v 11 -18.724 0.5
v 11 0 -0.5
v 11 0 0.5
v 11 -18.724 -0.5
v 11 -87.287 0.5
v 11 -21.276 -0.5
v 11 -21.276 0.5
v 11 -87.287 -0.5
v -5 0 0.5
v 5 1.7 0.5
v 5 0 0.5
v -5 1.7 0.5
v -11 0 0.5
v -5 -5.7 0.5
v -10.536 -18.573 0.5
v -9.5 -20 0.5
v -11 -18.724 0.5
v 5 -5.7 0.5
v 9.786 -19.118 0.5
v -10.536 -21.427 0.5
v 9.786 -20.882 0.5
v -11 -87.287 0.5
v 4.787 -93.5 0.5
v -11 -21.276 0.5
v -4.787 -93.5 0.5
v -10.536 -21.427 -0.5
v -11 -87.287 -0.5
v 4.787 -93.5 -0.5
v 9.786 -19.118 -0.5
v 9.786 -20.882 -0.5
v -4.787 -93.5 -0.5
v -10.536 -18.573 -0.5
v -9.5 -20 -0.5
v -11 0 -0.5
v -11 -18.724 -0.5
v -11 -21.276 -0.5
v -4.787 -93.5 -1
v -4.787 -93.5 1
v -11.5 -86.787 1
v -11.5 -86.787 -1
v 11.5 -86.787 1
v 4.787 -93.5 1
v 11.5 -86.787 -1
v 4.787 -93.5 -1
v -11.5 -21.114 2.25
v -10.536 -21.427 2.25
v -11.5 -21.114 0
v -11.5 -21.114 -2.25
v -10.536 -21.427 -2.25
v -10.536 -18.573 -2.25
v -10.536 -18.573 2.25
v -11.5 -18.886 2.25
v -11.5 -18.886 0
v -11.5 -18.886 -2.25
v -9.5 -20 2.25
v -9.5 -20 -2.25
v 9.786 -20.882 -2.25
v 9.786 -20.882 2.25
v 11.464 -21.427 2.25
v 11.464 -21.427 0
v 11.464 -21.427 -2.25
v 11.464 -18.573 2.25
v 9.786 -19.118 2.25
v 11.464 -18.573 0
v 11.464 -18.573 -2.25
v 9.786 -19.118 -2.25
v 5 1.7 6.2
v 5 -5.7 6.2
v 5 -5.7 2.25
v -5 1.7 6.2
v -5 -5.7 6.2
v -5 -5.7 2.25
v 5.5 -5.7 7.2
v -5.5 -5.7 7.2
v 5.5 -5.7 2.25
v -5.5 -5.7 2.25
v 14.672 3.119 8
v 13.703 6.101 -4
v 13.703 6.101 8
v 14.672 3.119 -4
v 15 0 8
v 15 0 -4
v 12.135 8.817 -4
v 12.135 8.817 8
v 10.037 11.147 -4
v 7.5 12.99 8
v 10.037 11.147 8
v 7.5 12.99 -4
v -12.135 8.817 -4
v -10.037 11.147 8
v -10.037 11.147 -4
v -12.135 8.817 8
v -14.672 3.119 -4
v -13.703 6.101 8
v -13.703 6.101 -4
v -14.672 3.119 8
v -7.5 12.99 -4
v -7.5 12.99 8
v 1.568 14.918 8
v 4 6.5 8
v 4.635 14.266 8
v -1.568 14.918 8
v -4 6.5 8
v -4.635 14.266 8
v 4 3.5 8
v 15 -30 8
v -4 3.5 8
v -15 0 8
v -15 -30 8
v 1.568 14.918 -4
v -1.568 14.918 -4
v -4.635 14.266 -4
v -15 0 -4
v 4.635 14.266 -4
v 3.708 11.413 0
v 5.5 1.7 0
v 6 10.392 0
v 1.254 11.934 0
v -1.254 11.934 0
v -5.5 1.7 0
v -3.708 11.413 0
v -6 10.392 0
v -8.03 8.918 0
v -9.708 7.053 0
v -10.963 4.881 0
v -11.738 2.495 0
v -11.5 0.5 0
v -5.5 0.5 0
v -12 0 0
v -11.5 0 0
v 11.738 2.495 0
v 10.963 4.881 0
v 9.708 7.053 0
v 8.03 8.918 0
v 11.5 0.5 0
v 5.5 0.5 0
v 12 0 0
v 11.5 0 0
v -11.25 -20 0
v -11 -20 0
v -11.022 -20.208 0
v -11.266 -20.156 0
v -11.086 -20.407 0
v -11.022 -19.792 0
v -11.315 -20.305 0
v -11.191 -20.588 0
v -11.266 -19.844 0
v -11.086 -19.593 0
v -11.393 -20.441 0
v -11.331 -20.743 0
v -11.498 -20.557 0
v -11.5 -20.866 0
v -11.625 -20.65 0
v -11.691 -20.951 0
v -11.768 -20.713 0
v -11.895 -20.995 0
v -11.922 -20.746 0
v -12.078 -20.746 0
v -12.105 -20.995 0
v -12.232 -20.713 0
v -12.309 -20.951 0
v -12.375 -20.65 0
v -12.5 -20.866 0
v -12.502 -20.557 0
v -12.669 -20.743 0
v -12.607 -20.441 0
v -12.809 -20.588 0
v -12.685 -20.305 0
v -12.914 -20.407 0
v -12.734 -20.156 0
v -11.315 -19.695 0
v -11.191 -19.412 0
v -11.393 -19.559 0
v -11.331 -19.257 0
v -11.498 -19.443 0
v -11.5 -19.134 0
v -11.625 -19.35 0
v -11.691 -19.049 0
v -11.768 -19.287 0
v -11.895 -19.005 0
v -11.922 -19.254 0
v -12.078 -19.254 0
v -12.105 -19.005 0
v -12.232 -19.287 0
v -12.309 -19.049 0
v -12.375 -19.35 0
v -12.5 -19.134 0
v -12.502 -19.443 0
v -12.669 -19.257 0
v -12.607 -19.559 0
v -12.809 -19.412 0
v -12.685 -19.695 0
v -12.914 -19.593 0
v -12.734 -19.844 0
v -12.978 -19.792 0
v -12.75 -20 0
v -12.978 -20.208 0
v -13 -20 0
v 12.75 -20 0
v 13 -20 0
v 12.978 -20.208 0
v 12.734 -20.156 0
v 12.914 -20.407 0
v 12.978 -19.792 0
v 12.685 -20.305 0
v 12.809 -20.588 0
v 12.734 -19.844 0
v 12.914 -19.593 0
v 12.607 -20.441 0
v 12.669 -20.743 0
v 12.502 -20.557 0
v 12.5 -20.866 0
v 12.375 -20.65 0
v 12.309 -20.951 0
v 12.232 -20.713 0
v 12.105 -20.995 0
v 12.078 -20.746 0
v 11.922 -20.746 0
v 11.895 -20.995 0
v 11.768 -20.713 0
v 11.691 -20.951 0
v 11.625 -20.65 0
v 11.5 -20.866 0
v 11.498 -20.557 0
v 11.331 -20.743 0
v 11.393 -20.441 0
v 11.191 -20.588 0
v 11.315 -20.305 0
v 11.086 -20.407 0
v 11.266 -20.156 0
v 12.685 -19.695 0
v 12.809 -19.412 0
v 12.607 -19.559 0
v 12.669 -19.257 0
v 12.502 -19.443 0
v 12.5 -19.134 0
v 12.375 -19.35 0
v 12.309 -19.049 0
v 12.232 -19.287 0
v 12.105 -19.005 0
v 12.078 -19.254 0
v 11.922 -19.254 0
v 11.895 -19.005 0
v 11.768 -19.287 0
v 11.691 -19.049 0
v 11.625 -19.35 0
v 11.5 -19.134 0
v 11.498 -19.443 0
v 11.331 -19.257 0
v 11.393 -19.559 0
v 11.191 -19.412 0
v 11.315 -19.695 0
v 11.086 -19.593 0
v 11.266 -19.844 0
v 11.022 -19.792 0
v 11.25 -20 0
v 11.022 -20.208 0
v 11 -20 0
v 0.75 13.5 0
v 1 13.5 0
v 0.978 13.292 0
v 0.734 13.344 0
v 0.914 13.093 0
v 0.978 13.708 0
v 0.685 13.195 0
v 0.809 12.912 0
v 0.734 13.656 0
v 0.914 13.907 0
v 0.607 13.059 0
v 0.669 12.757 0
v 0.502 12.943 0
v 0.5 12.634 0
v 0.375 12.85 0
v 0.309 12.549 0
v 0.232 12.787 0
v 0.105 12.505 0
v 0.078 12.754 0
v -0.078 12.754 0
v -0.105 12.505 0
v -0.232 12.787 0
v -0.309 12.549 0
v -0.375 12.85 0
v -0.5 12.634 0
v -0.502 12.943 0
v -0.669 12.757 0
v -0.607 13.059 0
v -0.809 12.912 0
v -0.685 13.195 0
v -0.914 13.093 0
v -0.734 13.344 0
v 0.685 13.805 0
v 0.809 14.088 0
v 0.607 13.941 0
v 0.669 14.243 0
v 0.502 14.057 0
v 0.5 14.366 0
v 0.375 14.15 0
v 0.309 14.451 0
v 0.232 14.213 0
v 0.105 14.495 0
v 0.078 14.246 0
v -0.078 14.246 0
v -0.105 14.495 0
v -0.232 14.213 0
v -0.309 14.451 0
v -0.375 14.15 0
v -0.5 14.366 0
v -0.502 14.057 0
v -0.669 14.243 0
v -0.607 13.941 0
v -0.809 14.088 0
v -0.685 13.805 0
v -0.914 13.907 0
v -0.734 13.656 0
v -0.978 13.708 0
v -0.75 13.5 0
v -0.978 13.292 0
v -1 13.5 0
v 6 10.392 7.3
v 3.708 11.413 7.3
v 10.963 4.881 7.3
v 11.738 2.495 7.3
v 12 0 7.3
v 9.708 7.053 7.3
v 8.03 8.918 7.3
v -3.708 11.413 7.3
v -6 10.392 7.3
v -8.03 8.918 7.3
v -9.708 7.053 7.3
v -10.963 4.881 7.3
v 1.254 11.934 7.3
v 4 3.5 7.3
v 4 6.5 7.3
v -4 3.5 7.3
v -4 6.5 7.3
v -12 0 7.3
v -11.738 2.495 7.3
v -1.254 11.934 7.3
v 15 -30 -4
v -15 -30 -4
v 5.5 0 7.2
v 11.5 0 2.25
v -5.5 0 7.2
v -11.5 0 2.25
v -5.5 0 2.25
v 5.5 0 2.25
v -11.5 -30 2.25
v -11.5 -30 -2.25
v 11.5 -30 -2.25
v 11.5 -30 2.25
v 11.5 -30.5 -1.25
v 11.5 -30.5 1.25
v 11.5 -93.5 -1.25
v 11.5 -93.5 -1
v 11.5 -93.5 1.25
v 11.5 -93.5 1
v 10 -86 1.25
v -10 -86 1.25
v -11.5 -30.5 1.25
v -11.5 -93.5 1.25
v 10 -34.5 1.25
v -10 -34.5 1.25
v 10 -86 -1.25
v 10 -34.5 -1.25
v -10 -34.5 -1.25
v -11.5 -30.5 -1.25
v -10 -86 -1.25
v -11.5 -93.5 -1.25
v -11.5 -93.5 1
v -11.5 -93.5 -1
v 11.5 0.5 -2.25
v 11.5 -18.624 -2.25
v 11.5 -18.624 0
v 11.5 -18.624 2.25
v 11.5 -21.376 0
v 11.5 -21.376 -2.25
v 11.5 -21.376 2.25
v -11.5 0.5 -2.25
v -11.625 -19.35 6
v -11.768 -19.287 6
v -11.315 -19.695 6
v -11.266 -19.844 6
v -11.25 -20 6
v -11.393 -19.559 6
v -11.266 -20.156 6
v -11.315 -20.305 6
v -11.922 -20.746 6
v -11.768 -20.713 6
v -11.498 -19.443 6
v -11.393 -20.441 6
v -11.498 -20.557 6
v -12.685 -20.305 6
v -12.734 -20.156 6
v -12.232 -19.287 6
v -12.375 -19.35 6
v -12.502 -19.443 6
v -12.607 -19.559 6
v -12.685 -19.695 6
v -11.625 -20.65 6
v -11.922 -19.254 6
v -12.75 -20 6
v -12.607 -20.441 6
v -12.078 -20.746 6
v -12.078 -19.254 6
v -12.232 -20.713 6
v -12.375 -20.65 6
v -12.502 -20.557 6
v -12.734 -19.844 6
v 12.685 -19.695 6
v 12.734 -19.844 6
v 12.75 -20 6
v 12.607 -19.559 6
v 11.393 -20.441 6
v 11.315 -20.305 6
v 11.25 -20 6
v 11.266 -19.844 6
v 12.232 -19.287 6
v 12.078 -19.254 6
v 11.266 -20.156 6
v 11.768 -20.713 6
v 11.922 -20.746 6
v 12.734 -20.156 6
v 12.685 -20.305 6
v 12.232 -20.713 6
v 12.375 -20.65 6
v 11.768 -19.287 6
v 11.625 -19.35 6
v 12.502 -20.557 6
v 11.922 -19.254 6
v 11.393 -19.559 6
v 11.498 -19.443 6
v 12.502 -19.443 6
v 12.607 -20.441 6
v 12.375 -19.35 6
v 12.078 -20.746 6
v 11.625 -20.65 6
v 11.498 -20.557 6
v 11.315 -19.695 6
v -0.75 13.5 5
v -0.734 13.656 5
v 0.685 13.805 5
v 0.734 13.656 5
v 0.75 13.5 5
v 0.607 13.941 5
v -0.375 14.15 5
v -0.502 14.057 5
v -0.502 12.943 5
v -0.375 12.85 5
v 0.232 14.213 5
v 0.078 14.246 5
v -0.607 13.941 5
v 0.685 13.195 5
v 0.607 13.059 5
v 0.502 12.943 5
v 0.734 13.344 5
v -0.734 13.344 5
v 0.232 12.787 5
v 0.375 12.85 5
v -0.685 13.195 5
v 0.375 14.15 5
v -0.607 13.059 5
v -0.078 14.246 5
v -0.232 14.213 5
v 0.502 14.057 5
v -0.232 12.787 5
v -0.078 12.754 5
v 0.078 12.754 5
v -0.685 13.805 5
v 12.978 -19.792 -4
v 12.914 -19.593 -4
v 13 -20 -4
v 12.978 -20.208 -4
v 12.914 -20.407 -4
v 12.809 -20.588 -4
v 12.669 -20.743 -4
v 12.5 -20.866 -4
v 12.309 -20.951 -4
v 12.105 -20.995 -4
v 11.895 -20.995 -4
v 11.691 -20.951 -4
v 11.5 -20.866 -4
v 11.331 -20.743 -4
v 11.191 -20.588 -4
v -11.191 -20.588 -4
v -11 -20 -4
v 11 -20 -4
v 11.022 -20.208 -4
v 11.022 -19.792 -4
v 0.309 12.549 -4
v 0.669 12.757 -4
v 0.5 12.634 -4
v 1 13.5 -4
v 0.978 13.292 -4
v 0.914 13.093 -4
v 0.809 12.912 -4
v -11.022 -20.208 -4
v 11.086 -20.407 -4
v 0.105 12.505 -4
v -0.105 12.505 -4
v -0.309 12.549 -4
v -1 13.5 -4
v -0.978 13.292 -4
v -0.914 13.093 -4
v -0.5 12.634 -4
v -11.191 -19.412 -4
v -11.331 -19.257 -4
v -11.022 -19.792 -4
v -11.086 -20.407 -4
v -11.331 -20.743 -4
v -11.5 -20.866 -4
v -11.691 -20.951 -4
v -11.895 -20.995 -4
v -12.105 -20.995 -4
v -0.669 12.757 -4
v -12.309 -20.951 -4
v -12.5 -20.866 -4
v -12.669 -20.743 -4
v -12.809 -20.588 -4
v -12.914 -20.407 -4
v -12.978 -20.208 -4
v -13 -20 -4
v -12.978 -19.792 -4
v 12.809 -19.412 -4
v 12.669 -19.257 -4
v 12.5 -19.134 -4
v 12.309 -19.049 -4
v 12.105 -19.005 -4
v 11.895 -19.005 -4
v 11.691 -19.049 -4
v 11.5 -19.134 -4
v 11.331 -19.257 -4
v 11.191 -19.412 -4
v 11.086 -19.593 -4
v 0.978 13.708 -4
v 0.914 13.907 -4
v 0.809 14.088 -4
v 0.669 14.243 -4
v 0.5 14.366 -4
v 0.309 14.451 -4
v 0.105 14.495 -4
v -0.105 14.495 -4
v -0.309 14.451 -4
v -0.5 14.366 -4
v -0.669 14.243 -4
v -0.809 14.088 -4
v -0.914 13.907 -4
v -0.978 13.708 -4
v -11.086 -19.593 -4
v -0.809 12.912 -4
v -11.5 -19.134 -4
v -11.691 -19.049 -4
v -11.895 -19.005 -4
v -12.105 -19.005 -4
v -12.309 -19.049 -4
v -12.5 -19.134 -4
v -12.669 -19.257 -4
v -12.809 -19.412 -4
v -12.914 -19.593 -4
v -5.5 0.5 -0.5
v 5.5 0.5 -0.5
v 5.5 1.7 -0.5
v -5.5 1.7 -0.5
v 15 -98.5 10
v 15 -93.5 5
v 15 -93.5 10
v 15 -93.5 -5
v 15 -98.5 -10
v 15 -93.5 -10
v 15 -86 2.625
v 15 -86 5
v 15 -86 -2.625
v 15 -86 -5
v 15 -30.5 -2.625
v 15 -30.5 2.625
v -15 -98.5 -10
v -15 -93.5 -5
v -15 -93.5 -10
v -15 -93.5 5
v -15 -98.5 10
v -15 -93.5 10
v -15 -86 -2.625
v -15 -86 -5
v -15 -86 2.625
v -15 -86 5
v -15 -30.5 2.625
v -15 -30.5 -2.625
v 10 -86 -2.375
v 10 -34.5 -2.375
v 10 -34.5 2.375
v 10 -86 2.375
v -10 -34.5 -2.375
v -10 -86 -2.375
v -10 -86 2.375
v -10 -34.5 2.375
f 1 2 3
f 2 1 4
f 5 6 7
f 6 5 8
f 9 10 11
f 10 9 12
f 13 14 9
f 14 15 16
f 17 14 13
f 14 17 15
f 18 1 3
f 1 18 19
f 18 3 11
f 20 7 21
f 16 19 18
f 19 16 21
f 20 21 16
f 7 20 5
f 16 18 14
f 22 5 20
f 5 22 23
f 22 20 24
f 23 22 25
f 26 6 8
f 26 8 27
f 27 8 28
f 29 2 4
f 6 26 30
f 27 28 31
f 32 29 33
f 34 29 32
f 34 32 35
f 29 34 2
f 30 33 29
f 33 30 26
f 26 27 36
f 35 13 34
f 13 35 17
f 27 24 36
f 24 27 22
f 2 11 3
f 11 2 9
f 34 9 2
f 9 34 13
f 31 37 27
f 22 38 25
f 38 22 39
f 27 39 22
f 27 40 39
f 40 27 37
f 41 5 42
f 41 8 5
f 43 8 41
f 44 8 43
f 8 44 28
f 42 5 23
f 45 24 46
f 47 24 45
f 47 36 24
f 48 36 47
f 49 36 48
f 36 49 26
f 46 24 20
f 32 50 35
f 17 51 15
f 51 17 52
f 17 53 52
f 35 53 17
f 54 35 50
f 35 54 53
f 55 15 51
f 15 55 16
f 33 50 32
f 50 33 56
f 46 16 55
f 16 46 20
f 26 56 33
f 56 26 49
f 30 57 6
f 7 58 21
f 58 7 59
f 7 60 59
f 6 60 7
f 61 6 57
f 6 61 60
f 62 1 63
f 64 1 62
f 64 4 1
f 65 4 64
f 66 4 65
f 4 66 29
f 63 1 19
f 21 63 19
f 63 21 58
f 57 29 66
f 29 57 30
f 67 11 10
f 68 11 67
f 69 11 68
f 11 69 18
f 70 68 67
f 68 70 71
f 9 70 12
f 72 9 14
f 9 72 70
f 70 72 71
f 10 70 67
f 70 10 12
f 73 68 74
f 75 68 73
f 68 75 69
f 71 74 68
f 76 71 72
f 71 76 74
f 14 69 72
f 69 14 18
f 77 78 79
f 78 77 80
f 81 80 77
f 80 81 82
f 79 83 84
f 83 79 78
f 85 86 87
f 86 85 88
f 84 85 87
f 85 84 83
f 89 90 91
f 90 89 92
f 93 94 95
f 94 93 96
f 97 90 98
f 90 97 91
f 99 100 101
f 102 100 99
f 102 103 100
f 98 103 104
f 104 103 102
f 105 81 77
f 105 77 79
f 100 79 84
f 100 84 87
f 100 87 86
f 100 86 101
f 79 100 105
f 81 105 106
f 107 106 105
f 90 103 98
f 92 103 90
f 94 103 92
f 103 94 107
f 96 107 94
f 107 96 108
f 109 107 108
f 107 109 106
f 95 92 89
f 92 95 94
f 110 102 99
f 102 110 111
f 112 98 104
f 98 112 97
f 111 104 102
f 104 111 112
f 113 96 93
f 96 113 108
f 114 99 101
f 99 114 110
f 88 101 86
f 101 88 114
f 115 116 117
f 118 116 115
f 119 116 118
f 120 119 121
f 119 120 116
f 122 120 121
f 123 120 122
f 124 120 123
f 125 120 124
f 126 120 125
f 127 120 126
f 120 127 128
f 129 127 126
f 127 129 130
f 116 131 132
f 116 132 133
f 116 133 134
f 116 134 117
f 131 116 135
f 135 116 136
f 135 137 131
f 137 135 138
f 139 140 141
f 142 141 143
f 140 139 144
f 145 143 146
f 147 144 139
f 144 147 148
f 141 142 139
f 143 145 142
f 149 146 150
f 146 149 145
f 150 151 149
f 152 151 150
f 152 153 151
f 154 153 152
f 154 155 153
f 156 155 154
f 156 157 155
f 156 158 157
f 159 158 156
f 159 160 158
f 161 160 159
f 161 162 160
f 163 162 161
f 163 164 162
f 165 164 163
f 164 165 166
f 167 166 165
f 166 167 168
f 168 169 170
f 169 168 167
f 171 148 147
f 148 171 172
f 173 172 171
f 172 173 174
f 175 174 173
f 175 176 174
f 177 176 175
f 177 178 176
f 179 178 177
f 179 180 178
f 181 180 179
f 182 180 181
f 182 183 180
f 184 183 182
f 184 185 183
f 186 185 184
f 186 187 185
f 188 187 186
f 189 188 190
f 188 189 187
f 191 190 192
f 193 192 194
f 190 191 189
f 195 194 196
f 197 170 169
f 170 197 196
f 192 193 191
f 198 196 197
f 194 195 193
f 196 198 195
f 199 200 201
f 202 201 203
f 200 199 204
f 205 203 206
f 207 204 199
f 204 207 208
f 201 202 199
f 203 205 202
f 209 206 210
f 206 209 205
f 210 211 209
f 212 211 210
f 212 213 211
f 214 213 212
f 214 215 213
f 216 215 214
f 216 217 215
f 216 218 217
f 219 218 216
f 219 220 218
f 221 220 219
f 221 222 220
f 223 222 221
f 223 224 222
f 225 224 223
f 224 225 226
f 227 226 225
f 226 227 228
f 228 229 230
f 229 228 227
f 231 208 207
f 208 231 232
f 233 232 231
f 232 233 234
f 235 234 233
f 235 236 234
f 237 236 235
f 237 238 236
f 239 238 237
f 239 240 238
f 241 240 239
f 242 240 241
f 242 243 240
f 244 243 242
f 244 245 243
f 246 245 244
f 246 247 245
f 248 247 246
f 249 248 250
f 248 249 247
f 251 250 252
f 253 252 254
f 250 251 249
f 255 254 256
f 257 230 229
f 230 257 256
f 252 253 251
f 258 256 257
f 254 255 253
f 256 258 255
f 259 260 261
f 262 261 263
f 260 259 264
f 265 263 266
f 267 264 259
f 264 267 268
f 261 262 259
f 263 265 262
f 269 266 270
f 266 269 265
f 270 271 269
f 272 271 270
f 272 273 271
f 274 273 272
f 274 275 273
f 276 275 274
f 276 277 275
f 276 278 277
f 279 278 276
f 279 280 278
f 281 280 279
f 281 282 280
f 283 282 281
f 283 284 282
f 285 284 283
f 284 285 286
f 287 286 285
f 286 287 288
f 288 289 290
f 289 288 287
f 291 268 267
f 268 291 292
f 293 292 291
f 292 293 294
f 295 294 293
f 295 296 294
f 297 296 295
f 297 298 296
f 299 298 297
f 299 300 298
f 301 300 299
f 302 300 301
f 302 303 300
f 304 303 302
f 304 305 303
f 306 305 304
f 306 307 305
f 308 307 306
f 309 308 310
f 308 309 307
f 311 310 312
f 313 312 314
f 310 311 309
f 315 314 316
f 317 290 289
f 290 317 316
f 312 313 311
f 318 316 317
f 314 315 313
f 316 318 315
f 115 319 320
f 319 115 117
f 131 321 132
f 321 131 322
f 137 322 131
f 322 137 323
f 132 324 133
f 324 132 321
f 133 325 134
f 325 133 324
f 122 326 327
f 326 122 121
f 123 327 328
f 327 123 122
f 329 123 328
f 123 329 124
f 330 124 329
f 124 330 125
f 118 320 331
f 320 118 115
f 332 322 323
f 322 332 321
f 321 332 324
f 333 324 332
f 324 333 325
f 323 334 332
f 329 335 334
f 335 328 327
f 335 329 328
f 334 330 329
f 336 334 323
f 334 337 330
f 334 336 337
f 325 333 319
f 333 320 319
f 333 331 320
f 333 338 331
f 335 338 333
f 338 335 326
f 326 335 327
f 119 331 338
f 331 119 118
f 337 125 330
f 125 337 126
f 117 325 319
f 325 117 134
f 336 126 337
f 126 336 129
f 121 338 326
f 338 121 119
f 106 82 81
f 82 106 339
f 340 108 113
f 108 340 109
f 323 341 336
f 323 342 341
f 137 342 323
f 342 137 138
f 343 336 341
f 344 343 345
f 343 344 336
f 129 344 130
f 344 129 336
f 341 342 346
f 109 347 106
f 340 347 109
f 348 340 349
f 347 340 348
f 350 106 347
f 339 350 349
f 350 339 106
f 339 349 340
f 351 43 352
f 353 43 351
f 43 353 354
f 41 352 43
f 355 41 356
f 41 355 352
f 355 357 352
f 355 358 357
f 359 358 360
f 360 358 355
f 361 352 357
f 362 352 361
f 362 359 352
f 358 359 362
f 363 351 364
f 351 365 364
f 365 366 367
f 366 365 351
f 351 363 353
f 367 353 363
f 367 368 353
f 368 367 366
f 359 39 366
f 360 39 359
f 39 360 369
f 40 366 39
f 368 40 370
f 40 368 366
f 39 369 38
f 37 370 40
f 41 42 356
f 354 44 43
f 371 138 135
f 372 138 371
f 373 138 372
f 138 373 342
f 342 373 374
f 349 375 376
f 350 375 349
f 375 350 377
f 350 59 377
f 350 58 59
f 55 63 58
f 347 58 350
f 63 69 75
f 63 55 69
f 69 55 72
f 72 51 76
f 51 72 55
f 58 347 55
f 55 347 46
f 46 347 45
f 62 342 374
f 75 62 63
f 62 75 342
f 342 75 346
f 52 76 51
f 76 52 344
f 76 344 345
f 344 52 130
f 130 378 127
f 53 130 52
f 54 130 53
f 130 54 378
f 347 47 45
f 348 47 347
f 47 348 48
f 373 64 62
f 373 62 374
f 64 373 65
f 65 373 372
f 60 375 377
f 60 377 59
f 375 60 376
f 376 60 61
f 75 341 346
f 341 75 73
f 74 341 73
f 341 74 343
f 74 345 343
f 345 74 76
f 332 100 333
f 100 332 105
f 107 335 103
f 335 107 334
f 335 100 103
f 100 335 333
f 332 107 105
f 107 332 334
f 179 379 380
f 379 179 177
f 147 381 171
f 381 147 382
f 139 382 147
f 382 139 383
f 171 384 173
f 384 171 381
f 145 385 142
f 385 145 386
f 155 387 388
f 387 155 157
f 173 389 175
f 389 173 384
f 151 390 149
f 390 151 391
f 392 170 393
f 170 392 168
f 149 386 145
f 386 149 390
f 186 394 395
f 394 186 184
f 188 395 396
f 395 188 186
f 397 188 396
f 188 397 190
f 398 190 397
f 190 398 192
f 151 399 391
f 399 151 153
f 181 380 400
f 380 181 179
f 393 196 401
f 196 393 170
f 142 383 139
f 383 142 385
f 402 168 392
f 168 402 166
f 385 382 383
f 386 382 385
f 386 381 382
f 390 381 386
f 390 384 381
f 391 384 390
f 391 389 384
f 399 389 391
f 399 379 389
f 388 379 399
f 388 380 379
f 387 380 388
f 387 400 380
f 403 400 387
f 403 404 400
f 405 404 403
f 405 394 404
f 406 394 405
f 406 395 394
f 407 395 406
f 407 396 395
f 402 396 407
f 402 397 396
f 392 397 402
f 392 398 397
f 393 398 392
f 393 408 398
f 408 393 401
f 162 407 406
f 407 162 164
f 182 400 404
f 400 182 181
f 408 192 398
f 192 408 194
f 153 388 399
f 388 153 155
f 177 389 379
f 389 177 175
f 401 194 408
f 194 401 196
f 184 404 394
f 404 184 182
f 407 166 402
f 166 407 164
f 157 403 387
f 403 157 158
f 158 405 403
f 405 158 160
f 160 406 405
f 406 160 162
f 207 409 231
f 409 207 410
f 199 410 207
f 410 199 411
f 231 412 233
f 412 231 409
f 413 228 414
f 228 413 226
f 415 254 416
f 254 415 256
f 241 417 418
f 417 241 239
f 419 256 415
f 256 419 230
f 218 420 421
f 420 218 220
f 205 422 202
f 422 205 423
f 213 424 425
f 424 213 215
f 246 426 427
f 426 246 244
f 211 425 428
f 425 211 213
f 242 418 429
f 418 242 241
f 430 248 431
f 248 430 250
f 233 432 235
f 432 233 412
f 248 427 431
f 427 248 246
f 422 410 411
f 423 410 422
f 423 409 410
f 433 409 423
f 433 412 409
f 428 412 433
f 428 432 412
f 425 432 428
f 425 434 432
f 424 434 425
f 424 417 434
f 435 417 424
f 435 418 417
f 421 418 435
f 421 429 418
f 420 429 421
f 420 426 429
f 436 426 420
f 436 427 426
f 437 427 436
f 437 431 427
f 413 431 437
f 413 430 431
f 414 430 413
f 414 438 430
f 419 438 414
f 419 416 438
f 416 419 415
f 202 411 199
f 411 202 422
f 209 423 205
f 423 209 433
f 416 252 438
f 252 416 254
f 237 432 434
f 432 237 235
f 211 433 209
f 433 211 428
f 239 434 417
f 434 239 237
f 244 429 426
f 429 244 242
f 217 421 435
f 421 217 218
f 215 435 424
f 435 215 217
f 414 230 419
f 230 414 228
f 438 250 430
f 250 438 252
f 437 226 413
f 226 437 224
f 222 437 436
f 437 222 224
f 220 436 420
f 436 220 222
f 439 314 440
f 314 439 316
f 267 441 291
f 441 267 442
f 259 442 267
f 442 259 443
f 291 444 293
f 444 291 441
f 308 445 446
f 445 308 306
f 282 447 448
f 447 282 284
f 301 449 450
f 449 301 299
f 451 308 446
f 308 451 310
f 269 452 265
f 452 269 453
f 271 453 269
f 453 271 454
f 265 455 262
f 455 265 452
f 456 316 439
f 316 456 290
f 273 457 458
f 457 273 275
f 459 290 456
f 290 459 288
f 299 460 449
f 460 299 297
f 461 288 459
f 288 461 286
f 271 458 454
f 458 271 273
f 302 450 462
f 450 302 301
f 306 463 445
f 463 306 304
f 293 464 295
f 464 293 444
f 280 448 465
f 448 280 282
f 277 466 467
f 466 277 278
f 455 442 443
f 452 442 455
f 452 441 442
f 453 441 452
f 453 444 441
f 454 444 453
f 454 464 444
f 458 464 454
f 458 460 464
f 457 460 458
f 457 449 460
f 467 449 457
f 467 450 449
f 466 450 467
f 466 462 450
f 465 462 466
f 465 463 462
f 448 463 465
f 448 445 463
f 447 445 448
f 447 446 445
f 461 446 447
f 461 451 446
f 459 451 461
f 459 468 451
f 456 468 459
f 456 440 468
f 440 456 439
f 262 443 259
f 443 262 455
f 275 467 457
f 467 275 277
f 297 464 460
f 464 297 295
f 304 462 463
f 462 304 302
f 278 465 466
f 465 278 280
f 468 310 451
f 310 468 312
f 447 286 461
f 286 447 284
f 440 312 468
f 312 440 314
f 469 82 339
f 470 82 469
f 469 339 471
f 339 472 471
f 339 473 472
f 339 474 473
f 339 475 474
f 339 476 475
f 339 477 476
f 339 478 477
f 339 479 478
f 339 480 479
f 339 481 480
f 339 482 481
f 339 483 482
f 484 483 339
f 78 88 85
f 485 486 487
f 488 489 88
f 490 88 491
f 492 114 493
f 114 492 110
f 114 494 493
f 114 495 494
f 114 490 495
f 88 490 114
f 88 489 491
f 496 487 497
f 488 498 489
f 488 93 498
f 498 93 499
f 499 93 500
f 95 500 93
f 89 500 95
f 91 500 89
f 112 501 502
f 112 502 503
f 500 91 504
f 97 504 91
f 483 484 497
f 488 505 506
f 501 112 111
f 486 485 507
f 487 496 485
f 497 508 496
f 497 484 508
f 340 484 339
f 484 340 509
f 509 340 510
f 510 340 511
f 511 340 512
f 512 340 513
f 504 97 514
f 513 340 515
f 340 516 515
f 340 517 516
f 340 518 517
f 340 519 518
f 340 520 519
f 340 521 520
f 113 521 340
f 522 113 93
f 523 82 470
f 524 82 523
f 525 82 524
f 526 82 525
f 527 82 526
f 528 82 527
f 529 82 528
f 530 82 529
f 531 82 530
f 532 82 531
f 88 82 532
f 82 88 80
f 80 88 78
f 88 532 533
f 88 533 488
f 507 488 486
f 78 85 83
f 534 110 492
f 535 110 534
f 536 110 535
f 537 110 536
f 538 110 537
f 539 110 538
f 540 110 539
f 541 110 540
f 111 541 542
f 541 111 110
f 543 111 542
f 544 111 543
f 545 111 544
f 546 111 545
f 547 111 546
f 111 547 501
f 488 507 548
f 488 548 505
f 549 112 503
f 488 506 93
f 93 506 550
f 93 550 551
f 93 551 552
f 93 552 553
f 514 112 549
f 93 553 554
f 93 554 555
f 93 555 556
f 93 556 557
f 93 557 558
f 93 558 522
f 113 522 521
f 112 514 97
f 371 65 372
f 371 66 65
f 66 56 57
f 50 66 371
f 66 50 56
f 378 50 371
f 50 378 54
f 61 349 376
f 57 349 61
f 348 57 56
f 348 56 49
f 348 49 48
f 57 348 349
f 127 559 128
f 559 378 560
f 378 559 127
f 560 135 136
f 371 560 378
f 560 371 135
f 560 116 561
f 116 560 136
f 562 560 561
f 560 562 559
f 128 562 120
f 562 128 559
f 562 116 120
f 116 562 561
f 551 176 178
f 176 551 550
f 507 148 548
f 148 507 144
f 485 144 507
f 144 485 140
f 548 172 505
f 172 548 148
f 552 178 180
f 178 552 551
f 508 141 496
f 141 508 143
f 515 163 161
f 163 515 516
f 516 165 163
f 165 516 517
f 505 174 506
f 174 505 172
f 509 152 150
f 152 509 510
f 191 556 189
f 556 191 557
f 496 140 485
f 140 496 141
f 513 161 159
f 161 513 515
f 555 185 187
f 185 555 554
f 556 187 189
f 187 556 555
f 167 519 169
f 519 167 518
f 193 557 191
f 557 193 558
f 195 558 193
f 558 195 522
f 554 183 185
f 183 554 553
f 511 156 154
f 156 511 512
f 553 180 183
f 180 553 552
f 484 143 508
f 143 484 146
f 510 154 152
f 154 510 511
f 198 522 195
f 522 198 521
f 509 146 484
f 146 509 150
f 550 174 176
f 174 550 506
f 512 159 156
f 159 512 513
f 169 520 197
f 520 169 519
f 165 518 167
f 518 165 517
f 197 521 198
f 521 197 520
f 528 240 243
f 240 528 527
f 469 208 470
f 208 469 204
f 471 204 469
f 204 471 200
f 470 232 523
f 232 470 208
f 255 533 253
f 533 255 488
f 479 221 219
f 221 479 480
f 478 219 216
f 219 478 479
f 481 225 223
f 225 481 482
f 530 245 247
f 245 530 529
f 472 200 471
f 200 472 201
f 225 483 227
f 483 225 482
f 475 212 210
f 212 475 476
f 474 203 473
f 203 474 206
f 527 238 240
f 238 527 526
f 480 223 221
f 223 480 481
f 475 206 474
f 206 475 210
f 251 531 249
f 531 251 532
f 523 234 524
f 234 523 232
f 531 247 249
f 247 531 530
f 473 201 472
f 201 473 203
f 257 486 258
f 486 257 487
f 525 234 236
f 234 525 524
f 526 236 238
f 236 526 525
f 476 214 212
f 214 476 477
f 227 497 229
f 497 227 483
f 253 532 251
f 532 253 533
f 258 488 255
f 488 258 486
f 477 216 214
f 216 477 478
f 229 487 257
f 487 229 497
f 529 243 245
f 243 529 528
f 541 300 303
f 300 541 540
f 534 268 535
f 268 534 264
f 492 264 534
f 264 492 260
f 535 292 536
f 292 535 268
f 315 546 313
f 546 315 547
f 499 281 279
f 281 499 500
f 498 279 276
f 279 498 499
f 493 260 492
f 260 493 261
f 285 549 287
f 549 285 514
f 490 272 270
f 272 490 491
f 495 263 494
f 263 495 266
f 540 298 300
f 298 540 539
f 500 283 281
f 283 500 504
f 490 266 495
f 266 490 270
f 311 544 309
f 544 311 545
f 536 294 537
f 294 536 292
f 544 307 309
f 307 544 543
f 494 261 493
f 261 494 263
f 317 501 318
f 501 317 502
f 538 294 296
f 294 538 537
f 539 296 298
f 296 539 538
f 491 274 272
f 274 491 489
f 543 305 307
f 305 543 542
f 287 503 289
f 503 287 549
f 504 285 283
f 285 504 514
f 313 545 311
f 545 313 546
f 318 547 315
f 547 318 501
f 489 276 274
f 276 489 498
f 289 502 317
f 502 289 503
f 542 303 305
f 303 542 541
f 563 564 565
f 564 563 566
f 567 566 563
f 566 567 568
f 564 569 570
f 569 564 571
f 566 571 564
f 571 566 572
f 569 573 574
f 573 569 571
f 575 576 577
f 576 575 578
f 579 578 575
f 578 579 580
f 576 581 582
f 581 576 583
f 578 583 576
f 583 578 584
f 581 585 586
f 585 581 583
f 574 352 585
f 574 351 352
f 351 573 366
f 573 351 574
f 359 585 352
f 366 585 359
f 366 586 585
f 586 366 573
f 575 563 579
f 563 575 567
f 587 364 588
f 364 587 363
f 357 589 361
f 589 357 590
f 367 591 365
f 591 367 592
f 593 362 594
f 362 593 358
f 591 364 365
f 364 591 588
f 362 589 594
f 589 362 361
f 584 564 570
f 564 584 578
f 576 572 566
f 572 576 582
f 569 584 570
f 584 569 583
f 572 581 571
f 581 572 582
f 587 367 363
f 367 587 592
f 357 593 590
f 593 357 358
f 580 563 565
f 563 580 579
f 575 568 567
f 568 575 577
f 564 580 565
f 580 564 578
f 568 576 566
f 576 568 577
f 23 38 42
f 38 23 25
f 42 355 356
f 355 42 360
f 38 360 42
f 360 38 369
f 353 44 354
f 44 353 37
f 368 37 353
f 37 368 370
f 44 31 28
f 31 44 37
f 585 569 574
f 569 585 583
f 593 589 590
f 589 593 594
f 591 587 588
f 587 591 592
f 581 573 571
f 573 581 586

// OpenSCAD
// Moisture Sensor

MoistureSensor = true;
MoistureSensorBox = true;
MoistureSensorBoxUnten = true;
MoistureSensorHuelle = true;
Membran = true;

if (MoistureSensor) MoistureSensor();
if (MoistureSensorBox) MoistureSensorBox();
if (MoistureSensorBoxUnten) MoistureSensorBoxUnten();
if (MoistureSensorHuelle) MoistureSensorHuelle();
if (Membran) { 
    Membran();
    translate([0,0,-5])
    Membran();
}

msl = 97.5;     //Sensor Länge
msb = 22.0;     //Sensor Breite
msh = 1.0;      //Sensor Höhe 

module MoistureSensor(negative=false) 

translate([0,-msl/2,0])
union() {
    
    // Kabelanschluss
    if (negative) {
        color("white")
        translate([0,msl/2-2,5.7/2+msh/2])
        cube([10+1,7.4,5.7],center=true);
    } else {
        color("white")
        translate([0,msl/2-2,5.7/2+msh/2])
        cube([10,7.4,5.7],center=true);
    }
    
    // PCB-Sensor
    color("darkgreen")
    difference(){
        if (negative) cube([msb+1,msl+1,msh+1.5],center=true);
        else cube([msb,msl,msh],center=true);
            
        translate([-msb,-msl/2,0])
        rotate([0,0,45])
        cube([30,30,2],center=true);
        
        translate([msb,-msl/2,0])
        rotate([0,0,45])
        cube([30,30,2],center=true);

        translate([-msb/2,-msl/2+77.5,-2])
        cylinder(d=3.0, h=5);

        translate([msb/2,-msl/2+77.5,-2])
        cylinder(d=3.0, h=5);
    }
}

module MoistureSensorBox() {
    
    difference(){
        boxOben();
        translate([0,0,1])
        MoistureSensor(true);
        
        // Kabelloch
        translate([0,5,6])
        cube([8,3,5.7],center=true);
        
        // Schraubloch
        translate([-12,-20,-2])
        cylinder(d=1.5,h=8,$fn=30);
        
        translate([12,-20,-2])
        cylinder(d=1.5,h=8,$fn=30);
        
        translate([0,13.5,-3])
        cylinder(d=1.5,h=8,$fn=30);
        
    }
}

module MoistureSensorBoxUnten() {   
    difference() {
        translate([0,0,-2])
        boxUnten();
        translate([0,0,-1])
        MoistureSensor(true);


        // Schraubloch
        translate([-12,-20,-5])
        cylinder(d=2,h=8,$fn=30);
        
        translate([12,-20,-5])
        cylinder(d=2,h=8,$fn=30);
        
        translate([0,13.5,-5])
        cylinder(d=2,h=8,$fn=30);
    }
}


module boxOben(){
    difference(){
        cylinder(d=30,h=8);
        translate([0,0,-1])
        cylinder(d=24,h=8.3);
    }
    
    translate([-15,-30,0])
    cube([30,30,8]);
 
    
}


module boxUnten() {
    translate([0,0,-2])
    union() {
        cylinder(d=30,h=4);
        translate([-15,-30,0])
        cube([30,30,4]);
    }       
}

module MoistureSensorHuelle() {
    difference() {
        translate([0,-64.5,0])
        cube([30,68,5],center=true);
        MoistureSensor(true);
        translate([0,-64.5,0])
        cube([20,60,10],center=true);
    }
    difference() {
        translate([0,-91,0])
        cube([30,10,10],center=true);
        MoistureSensor(true);
    }    
    translate([0,-96,0])
    cube([30,5,20],center=true);
}

module Membran() {
    color("white")
    translate([0,-58.5,2.5])
    cube([30,56,0.25],center=true);
}
